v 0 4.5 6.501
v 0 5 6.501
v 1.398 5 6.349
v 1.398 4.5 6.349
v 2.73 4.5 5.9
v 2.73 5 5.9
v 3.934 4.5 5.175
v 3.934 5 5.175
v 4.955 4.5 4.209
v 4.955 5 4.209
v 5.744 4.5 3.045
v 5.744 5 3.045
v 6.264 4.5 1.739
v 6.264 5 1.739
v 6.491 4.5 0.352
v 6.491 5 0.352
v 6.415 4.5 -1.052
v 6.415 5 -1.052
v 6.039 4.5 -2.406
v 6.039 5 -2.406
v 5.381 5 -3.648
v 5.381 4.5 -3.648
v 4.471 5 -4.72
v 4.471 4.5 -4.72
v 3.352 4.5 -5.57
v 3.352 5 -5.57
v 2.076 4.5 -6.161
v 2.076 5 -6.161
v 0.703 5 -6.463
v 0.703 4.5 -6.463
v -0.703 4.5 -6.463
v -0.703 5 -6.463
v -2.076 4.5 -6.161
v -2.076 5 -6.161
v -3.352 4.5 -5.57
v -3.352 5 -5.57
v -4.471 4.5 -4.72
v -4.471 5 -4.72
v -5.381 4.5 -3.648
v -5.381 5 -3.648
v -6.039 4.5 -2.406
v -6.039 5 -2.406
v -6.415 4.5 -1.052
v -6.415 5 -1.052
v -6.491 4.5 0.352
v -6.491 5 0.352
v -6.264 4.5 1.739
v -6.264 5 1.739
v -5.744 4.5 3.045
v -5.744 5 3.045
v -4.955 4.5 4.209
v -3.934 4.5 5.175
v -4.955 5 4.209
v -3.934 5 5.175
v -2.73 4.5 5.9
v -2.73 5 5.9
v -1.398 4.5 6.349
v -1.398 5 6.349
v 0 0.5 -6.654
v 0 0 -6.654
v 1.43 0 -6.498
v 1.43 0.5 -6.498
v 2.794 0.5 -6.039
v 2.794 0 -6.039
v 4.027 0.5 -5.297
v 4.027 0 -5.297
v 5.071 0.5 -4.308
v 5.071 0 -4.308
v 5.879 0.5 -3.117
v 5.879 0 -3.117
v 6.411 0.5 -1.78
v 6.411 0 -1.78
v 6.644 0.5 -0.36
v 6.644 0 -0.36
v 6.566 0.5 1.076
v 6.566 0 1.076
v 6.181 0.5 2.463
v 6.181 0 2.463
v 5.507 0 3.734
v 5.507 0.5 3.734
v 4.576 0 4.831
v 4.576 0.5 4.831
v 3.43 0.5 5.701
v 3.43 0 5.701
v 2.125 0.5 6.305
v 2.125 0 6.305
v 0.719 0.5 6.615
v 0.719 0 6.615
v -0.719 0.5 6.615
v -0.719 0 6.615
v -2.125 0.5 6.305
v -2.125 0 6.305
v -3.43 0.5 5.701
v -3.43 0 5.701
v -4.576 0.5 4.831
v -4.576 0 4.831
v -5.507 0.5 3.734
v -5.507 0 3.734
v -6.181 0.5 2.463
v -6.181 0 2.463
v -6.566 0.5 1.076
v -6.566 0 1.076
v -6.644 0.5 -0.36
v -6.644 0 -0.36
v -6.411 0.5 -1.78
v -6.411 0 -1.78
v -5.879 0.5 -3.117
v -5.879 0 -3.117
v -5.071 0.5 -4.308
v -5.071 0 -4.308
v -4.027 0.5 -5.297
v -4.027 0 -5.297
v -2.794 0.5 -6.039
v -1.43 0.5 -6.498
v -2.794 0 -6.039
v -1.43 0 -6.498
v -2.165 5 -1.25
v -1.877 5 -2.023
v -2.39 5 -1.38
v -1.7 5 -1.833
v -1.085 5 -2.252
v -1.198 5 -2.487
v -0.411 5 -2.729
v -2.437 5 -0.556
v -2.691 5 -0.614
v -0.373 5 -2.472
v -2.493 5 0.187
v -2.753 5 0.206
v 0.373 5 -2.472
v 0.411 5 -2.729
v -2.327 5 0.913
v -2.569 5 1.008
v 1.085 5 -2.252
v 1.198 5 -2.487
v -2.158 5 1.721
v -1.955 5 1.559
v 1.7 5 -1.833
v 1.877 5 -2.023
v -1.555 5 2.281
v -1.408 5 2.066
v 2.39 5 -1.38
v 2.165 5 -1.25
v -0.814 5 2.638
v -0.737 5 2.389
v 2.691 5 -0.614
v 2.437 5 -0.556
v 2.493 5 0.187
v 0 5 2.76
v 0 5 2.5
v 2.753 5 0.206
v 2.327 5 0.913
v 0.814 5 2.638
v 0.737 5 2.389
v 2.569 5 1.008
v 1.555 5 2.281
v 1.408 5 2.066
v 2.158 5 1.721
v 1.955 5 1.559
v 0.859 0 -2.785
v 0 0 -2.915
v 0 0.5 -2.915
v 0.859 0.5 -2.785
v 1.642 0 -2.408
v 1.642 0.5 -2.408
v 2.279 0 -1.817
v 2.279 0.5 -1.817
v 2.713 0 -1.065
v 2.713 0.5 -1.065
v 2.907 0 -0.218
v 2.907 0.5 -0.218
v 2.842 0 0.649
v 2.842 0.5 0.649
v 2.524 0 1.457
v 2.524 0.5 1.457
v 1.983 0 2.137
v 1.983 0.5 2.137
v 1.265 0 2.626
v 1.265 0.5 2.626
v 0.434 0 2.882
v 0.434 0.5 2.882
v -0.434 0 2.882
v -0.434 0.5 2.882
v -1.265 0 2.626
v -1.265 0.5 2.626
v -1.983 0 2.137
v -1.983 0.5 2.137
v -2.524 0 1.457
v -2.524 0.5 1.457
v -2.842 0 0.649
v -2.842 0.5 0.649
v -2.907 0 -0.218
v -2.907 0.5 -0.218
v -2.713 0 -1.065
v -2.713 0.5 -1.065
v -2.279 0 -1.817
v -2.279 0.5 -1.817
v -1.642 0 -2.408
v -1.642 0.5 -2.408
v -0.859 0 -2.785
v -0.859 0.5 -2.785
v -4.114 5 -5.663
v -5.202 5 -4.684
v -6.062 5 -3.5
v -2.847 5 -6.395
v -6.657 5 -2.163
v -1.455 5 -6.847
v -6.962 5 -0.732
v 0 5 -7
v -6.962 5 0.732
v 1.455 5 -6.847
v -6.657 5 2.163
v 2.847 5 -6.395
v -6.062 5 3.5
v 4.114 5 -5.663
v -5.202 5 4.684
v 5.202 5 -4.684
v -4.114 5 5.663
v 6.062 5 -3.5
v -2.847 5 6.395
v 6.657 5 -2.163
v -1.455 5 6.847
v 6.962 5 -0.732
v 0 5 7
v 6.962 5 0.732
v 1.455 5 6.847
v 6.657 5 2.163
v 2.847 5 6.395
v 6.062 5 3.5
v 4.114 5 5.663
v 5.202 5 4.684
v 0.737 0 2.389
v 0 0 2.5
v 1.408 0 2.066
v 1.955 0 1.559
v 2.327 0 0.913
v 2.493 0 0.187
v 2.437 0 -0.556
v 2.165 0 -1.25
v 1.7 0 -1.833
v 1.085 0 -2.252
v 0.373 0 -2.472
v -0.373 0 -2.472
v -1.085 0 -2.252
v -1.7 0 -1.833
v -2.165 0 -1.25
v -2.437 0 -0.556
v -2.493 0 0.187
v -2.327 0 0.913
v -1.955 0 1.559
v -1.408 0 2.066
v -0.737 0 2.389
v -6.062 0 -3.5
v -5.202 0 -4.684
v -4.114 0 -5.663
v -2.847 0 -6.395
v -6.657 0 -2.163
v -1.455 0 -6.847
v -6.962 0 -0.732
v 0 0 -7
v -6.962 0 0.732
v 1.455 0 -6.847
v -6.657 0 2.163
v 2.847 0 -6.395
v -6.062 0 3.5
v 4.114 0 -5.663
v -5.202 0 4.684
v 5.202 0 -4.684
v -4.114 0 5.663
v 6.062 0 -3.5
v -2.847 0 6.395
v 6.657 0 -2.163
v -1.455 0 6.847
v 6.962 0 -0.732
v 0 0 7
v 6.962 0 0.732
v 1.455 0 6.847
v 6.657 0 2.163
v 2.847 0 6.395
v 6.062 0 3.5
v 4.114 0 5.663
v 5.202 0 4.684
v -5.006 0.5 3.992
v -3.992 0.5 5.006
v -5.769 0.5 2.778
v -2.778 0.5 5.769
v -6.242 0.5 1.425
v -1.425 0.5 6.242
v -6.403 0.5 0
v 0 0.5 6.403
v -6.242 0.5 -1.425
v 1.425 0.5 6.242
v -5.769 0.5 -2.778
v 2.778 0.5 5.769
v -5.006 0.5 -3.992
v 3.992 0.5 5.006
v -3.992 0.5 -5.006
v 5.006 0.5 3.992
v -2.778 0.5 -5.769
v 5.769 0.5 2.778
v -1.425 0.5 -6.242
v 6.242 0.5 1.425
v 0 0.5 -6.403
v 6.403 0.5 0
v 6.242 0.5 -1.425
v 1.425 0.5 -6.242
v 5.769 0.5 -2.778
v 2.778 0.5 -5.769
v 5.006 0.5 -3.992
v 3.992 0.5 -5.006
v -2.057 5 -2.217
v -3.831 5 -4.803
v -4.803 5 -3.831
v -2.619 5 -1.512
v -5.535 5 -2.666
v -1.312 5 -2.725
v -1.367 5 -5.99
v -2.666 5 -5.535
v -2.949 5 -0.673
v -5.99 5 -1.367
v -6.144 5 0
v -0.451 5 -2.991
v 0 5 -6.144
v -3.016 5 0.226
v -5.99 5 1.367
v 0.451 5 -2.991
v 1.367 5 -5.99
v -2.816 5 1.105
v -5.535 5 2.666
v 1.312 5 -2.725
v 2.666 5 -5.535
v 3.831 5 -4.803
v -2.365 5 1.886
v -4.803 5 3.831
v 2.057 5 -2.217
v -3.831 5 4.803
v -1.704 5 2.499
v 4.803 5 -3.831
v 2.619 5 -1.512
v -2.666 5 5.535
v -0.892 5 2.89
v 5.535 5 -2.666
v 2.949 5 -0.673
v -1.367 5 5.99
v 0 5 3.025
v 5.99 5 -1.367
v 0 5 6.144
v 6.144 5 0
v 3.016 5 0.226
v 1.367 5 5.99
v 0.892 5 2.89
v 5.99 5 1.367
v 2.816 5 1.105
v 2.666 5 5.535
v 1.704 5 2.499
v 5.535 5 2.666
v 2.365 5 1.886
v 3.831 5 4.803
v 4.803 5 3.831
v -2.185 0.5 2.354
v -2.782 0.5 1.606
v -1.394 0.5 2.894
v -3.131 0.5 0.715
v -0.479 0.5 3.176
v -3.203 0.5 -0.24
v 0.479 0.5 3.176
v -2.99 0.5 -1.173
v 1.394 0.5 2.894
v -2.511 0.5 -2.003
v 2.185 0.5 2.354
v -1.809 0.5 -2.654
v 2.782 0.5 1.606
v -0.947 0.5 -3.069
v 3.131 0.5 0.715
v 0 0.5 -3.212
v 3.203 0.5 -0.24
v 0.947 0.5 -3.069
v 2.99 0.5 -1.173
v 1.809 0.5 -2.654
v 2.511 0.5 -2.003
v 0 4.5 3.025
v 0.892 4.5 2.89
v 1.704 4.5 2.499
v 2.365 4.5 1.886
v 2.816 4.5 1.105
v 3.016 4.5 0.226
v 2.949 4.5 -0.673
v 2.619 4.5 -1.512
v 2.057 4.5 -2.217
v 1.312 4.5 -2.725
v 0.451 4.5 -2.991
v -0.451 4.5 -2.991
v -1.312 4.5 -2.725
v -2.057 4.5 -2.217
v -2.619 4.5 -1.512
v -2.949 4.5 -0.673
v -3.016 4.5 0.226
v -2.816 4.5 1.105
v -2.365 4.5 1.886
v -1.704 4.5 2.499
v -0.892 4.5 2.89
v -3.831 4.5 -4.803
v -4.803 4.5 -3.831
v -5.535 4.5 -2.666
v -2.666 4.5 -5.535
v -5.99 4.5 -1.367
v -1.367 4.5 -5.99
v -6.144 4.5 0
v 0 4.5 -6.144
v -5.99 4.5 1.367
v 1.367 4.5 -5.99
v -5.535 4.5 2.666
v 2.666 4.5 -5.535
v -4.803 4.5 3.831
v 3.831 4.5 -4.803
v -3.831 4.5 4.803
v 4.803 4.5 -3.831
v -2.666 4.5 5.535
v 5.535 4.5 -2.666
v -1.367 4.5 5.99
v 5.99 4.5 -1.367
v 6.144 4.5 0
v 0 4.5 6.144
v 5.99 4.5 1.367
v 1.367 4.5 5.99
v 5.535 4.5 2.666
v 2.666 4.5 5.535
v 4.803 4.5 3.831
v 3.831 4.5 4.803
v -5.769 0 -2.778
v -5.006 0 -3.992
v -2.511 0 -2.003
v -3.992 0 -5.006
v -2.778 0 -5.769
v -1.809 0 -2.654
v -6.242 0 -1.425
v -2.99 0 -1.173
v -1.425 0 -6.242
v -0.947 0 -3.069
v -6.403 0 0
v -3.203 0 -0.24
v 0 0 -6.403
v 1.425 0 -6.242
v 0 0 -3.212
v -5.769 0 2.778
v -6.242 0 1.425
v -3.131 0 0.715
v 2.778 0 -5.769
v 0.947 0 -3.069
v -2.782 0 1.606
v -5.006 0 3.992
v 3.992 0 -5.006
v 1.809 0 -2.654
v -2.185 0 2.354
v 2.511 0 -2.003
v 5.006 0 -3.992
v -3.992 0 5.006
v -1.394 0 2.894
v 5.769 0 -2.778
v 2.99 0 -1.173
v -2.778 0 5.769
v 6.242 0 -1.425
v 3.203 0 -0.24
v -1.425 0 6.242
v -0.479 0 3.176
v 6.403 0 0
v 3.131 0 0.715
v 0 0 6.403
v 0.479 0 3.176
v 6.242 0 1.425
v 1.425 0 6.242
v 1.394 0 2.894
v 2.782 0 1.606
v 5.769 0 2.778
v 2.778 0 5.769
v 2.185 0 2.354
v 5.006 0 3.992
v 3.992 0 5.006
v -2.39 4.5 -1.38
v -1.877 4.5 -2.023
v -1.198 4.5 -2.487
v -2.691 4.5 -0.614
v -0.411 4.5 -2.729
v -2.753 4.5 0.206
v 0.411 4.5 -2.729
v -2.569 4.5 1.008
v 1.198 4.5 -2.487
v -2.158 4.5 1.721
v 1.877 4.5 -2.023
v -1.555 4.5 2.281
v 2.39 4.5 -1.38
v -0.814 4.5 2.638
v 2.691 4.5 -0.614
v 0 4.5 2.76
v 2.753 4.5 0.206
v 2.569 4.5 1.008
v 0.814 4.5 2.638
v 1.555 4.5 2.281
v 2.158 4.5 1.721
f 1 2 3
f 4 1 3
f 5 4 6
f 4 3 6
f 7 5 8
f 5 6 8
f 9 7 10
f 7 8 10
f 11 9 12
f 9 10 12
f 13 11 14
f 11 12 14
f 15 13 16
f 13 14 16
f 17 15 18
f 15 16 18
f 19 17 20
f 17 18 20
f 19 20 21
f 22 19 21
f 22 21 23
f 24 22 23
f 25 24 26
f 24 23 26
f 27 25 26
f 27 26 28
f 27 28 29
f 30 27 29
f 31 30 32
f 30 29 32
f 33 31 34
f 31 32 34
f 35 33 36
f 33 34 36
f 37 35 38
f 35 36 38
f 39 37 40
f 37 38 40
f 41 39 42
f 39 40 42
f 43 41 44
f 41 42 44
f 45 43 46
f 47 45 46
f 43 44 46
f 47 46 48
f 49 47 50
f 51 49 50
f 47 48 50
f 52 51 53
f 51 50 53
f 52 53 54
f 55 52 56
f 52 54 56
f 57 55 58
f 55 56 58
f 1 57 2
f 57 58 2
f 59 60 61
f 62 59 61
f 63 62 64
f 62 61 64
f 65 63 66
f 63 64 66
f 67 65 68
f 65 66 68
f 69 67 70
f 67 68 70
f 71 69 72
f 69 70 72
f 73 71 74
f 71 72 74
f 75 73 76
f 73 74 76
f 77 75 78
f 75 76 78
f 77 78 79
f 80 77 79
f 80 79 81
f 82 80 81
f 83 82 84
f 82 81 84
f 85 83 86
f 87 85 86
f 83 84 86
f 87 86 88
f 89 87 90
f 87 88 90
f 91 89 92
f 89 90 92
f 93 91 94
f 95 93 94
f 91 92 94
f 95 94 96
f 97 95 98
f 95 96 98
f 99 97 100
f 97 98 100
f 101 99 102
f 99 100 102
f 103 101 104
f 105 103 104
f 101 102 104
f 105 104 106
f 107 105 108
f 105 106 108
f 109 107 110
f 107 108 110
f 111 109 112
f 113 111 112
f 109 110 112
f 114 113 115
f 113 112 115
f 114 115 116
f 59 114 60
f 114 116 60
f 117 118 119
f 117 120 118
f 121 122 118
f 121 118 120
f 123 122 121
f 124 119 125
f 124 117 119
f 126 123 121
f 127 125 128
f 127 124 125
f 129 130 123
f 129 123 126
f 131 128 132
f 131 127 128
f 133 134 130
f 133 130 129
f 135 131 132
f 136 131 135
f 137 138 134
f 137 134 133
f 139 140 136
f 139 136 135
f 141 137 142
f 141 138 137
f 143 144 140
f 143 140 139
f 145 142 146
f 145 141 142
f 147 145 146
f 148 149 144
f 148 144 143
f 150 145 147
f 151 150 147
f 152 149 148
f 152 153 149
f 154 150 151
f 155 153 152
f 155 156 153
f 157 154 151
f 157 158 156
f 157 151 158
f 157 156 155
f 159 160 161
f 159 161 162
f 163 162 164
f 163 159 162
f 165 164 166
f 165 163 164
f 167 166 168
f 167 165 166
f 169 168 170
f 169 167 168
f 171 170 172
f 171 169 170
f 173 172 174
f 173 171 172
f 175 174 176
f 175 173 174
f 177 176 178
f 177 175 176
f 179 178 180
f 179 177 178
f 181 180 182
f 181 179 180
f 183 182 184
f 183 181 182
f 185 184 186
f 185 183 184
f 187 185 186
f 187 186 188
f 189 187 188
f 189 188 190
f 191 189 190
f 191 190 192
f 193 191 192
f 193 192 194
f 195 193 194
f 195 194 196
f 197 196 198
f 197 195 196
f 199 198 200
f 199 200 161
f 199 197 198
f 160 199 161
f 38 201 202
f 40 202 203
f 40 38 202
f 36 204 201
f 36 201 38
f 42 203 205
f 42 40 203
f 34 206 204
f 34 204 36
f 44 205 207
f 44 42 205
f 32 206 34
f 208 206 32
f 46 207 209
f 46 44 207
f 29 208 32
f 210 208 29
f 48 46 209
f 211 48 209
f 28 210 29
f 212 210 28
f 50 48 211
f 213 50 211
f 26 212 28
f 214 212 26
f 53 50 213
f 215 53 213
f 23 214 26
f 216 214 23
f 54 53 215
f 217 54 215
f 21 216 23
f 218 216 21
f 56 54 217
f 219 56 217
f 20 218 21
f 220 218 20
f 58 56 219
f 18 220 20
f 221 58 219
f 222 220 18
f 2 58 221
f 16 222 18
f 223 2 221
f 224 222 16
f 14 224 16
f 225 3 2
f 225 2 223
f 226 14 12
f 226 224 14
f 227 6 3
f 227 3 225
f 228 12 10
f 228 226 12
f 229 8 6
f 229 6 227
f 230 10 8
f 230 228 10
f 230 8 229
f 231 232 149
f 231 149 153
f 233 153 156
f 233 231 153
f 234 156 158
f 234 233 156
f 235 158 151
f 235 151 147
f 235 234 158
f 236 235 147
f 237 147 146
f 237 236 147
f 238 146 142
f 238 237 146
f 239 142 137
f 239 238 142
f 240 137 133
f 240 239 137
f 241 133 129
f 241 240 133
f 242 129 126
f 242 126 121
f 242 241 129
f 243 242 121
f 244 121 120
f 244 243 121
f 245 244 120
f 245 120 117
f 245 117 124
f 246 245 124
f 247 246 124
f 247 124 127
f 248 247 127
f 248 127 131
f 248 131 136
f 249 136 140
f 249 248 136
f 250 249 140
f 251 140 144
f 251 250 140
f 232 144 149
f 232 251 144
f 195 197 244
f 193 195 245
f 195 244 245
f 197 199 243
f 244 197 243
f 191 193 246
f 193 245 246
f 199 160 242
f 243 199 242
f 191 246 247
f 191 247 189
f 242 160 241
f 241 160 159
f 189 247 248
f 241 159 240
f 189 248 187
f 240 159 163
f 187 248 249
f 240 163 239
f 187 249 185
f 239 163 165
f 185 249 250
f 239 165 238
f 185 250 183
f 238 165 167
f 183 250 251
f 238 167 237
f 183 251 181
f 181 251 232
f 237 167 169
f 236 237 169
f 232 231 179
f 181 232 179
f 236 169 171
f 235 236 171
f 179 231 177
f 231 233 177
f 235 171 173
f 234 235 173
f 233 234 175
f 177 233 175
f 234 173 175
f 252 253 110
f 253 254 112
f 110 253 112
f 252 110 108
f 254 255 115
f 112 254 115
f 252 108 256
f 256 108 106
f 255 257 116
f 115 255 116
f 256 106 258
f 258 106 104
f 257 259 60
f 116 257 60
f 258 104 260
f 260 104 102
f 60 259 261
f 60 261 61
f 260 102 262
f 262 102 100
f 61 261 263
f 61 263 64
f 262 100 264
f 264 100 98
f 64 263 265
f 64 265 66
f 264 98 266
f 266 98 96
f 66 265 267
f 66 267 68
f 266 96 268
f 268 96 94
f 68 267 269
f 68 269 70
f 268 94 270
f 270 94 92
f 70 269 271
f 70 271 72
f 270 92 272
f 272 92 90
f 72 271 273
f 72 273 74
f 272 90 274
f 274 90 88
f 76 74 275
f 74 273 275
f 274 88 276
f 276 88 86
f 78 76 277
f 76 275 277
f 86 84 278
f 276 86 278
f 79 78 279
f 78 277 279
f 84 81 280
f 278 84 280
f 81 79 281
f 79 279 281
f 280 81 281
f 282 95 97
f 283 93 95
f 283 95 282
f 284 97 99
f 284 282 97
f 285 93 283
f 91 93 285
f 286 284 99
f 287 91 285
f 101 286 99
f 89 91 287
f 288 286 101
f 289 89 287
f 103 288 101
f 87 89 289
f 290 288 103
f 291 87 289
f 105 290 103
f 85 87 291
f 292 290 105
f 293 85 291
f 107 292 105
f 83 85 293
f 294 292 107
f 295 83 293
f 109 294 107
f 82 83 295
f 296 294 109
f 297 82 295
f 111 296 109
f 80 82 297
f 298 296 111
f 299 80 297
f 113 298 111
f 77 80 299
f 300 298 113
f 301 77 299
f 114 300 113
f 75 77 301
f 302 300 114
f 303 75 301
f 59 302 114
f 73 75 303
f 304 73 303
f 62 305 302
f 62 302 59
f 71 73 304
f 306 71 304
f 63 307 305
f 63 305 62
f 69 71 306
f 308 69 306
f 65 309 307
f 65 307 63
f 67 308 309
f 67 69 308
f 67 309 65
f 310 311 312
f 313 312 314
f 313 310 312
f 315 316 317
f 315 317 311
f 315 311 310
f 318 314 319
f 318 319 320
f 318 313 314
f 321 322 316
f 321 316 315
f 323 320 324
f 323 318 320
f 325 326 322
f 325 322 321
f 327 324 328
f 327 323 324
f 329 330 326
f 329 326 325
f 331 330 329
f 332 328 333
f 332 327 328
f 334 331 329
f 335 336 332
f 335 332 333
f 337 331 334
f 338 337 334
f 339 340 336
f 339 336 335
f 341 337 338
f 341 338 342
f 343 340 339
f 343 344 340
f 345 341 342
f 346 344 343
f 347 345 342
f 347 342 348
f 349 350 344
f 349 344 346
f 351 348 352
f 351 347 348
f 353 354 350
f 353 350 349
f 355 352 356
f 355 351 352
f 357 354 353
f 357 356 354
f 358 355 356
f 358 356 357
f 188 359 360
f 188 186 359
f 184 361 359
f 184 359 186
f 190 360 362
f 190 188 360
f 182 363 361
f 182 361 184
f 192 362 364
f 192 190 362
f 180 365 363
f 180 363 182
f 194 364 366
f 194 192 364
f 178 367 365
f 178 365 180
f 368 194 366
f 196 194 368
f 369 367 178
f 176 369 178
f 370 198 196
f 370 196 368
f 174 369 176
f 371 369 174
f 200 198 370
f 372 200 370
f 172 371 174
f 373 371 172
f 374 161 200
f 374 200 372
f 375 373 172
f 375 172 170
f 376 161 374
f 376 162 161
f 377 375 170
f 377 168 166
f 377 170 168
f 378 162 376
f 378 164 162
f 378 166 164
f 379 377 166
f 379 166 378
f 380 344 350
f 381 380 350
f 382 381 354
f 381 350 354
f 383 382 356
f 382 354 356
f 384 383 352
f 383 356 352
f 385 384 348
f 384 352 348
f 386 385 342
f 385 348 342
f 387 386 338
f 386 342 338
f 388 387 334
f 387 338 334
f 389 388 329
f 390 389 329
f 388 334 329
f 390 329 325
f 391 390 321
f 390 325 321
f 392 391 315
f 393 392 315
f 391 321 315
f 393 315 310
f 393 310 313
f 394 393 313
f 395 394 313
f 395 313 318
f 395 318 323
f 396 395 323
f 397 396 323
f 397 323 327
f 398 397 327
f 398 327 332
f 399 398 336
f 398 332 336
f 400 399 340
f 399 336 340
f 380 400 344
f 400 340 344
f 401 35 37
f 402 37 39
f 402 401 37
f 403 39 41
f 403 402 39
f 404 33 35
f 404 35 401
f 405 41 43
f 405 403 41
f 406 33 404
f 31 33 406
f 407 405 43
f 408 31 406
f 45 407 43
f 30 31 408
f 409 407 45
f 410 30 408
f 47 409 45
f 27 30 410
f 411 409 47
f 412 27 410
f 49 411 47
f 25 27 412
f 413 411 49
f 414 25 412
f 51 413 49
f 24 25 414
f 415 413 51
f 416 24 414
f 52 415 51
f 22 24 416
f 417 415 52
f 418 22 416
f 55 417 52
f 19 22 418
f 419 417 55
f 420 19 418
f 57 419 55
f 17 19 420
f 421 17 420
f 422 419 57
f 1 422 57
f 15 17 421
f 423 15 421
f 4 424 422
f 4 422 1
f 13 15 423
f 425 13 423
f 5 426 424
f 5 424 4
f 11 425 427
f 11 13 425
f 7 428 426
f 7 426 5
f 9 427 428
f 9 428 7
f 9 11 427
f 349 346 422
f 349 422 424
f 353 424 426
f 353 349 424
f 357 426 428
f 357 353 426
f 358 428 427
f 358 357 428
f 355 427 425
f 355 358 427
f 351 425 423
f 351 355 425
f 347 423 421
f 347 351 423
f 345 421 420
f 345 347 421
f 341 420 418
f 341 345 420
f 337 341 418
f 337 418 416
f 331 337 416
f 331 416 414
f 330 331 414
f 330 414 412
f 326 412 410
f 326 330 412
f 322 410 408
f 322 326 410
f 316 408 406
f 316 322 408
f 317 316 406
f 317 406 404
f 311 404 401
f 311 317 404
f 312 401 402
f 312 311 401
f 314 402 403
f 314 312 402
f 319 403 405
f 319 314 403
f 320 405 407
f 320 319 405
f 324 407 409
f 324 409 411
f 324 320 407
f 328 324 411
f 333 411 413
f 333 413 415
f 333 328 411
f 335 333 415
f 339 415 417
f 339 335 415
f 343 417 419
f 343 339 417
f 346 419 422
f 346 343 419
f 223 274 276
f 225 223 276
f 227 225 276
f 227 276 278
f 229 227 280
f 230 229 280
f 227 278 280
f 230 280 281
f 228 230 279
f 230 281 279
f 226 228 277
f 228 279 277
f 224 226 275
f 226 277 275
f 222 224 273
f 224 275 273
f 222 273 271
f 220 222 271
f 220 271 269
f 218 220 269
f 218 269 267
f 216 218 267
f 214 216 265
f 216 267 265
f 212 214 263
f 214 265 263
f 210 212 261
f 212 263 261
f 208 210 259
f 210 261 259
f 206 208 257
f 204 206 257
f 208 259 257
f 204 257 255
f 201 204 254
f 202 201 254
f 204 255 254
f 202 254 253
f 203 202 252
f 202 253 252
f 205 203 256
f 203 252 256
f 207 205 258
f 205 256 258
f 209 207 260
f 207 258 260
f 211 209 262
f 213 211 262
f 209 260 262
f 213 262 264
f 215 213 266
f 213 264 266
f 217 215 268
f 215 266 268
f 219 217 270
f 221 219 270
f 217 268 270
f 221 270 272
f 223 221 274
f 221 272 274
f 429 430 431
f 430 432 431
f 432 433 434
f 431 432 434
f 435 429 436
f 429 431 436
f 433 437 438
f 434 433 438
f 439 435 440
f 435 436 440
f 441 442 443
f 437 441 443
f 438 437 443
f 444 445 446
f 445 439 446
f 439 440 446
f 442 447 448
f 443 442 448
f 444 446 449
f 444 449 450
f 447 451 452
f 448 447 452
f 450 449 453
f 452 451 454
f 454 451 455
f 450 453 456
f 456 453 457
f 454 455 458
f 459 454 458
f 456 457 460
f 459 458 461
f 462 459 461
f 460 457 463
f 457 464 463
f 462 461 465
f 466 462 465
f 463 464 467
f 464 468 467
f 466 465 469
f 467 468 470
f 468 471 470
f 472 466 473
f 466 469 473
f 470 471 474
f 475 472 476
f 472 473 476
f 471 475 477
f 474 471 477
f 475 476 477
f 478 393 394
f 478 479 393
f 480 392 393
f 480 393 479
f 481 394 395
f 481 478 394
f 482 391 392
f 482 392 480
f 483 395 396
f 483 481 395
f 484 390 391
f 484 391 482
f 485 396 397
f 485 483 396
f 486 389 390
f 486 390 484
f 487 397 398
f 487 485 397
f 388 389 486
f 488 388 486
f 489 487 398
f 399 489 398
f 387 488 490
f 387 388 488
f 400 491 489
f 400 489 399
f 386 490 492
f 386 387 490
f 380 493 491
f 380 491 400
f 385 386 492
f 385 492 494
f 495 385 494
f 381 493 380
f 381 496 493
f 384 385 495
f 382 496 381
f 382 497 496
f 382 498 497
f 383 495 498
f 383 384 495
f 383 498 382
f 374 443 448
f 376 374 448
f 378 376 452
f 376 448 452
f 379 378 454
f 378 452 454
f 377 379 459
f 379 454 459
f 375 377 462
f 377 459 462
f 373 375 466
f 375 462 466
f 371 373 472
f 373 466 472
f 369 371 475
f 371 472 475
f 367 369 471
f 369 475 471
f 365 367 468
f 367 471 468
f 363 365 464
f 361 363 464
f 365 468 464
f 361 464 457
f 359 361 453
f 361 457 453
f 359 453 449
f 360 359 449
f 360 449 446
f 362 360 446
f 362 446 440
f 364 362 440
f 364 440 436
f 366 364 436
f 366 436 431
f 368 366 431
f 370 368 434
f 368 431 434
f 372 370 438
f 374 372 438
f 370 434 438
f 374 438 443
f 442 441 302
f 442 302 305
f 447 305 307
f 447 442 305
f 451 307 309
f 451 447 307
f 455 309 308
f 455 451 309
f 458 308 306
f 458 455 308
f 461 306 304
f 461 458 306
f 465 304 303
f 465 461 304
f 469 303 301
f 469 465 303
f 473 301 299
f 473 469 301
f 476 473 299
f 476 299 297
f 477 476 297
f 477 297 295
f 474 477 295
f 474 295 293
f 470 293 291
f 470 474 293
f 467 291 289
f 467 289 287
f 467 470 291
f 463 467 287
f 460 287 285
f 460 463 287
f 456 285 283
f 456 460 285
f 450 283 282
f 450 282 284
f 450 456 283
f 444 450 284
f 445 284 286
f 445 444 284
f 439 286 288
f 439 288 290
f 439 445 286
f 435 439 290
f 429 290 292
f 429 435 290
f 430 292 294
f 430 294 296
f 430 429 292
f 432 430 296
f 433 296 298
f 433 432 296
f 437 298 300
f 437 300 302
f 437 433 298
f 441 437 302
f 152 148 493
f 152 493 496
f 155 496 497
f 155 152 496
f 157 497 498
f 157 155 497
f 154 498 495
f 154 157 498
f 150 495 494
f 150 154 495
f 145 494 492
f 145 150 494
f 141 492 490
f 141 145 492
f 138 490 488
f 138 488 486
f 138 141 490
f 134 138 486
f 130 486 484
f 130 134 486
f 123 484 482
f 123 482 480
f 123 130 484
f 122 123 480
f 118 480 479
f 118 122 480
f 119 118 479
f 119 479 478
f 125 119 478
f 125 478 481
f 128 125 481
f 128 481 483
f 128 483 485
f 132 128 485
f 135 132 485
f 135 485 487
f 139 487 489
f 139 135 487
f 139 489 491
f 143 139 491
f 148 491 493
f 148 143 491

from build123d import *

# Parameters (mm, degrees)
SKETCH1_R           = 7
SKETCH1_R_2         = 2.5
BOSS_EXTRUDE1_DEPTH = 5
SKETCH2_R           = 3.024719142
SKETCH2_R_2         = 2.760237687
CUT_EXTRUDE1_DEPTH  = 0.5
SKETCH3_R           = 6.500951531
SKETCH3_R_2         = 6.143653391
CUT_EXTRUDE2_DEPTH  = 0.5
SKETCH4_R           = 6.653685529
SKETCH4_R_2         = 6.402971613
SKETCH4_R_3         = 3.211895498
SKETCH4_R_4         = 2.91485273
CUT_EXTRUDE3_DEPTH  = 0.5


with BuildPart() as part:
    # Sketch1 → Boss-Extrude1 (new body)
    with BuildSketch(Plane(origin=(0, 0, 0), x_dir=(1, 0, 0), z_dir=(0, 1, 0))):
        with Locations(Location((0, 0, 0), (0, 0, 270))):
            Circle(SKETCH1_R)
        with Locations(Location((0, 0, 0), (0, 0, 270))):
            Circle(SKETCH1_R_2, mode=Mode.SUBTRACT)
    extrude(amount=BOSS_EXTRUDE1_DEPTH)

    # Sketch2 → Cut-Extrude1 (cut)
    with BuildSketch(Plane(origin=(0, 5, 0), x_dir=(1, 0, 0), z_dir=(0, 1, 0))):
        with Locations(Location((0, 0, 0), (0, 0, 270))):
            Circle(SKETCH2_R)
        with Locations(Location((0, 0, 0), (0, 0, 270))):
            Circle(SKETCH2_R_2, mode=Mode.SUBTRACT)
    extrude(amount=-CUT_EXTRUDE1_DEPTH, mode=Mode.SUBTRACT)

    # Sketch3 → Cut-Extrude2 (cut)
    with BuildSketch(Plane(origin=(0, 5, 0), x_dir=(1, 0, 0), z_dir=(0, 1, 0))):
        with Locations(Location((0, 0, 0), (0, 0, 270))):
            Circle(SKETCH3_R)
        with Locations(Location((0, 0, 0), (0, 0, 270))):
            Circle(SKETCH3_R_2, mode=Mode.SUBTRACT)
    extrude(amount=-CUT_EXTRUDE2_DEPTH, mode=Mode.SUBTRACT)

    # Sketch4 → Cut-Extrude3 (cut)
    with BuildSketch(Plane.XZ):
        with Locations(Location((0, 0, 0), (0, 0, 270))):
            Circle(SKETCH4_R)
        with Locations(Location((0, 0, 0), (0, 0, 270))):
            Circle(SKETCH4_R_2, mode=Mode.SUBTRACT)
        with Locations(Location((0, 0, 0), (0, 0, 270))):
            Circle(SKETCH4_R_3)
        with Locations(Location((0, 0, 0), (0, 0, 270))):
            Circle(SKETCH4_R_4, mode=Mode.SUBTRACT)
    extrude(amount=-CUT_EXTRUDE3_DEPTH, mode=Mode.SUBTRACT)


solid = part.part
